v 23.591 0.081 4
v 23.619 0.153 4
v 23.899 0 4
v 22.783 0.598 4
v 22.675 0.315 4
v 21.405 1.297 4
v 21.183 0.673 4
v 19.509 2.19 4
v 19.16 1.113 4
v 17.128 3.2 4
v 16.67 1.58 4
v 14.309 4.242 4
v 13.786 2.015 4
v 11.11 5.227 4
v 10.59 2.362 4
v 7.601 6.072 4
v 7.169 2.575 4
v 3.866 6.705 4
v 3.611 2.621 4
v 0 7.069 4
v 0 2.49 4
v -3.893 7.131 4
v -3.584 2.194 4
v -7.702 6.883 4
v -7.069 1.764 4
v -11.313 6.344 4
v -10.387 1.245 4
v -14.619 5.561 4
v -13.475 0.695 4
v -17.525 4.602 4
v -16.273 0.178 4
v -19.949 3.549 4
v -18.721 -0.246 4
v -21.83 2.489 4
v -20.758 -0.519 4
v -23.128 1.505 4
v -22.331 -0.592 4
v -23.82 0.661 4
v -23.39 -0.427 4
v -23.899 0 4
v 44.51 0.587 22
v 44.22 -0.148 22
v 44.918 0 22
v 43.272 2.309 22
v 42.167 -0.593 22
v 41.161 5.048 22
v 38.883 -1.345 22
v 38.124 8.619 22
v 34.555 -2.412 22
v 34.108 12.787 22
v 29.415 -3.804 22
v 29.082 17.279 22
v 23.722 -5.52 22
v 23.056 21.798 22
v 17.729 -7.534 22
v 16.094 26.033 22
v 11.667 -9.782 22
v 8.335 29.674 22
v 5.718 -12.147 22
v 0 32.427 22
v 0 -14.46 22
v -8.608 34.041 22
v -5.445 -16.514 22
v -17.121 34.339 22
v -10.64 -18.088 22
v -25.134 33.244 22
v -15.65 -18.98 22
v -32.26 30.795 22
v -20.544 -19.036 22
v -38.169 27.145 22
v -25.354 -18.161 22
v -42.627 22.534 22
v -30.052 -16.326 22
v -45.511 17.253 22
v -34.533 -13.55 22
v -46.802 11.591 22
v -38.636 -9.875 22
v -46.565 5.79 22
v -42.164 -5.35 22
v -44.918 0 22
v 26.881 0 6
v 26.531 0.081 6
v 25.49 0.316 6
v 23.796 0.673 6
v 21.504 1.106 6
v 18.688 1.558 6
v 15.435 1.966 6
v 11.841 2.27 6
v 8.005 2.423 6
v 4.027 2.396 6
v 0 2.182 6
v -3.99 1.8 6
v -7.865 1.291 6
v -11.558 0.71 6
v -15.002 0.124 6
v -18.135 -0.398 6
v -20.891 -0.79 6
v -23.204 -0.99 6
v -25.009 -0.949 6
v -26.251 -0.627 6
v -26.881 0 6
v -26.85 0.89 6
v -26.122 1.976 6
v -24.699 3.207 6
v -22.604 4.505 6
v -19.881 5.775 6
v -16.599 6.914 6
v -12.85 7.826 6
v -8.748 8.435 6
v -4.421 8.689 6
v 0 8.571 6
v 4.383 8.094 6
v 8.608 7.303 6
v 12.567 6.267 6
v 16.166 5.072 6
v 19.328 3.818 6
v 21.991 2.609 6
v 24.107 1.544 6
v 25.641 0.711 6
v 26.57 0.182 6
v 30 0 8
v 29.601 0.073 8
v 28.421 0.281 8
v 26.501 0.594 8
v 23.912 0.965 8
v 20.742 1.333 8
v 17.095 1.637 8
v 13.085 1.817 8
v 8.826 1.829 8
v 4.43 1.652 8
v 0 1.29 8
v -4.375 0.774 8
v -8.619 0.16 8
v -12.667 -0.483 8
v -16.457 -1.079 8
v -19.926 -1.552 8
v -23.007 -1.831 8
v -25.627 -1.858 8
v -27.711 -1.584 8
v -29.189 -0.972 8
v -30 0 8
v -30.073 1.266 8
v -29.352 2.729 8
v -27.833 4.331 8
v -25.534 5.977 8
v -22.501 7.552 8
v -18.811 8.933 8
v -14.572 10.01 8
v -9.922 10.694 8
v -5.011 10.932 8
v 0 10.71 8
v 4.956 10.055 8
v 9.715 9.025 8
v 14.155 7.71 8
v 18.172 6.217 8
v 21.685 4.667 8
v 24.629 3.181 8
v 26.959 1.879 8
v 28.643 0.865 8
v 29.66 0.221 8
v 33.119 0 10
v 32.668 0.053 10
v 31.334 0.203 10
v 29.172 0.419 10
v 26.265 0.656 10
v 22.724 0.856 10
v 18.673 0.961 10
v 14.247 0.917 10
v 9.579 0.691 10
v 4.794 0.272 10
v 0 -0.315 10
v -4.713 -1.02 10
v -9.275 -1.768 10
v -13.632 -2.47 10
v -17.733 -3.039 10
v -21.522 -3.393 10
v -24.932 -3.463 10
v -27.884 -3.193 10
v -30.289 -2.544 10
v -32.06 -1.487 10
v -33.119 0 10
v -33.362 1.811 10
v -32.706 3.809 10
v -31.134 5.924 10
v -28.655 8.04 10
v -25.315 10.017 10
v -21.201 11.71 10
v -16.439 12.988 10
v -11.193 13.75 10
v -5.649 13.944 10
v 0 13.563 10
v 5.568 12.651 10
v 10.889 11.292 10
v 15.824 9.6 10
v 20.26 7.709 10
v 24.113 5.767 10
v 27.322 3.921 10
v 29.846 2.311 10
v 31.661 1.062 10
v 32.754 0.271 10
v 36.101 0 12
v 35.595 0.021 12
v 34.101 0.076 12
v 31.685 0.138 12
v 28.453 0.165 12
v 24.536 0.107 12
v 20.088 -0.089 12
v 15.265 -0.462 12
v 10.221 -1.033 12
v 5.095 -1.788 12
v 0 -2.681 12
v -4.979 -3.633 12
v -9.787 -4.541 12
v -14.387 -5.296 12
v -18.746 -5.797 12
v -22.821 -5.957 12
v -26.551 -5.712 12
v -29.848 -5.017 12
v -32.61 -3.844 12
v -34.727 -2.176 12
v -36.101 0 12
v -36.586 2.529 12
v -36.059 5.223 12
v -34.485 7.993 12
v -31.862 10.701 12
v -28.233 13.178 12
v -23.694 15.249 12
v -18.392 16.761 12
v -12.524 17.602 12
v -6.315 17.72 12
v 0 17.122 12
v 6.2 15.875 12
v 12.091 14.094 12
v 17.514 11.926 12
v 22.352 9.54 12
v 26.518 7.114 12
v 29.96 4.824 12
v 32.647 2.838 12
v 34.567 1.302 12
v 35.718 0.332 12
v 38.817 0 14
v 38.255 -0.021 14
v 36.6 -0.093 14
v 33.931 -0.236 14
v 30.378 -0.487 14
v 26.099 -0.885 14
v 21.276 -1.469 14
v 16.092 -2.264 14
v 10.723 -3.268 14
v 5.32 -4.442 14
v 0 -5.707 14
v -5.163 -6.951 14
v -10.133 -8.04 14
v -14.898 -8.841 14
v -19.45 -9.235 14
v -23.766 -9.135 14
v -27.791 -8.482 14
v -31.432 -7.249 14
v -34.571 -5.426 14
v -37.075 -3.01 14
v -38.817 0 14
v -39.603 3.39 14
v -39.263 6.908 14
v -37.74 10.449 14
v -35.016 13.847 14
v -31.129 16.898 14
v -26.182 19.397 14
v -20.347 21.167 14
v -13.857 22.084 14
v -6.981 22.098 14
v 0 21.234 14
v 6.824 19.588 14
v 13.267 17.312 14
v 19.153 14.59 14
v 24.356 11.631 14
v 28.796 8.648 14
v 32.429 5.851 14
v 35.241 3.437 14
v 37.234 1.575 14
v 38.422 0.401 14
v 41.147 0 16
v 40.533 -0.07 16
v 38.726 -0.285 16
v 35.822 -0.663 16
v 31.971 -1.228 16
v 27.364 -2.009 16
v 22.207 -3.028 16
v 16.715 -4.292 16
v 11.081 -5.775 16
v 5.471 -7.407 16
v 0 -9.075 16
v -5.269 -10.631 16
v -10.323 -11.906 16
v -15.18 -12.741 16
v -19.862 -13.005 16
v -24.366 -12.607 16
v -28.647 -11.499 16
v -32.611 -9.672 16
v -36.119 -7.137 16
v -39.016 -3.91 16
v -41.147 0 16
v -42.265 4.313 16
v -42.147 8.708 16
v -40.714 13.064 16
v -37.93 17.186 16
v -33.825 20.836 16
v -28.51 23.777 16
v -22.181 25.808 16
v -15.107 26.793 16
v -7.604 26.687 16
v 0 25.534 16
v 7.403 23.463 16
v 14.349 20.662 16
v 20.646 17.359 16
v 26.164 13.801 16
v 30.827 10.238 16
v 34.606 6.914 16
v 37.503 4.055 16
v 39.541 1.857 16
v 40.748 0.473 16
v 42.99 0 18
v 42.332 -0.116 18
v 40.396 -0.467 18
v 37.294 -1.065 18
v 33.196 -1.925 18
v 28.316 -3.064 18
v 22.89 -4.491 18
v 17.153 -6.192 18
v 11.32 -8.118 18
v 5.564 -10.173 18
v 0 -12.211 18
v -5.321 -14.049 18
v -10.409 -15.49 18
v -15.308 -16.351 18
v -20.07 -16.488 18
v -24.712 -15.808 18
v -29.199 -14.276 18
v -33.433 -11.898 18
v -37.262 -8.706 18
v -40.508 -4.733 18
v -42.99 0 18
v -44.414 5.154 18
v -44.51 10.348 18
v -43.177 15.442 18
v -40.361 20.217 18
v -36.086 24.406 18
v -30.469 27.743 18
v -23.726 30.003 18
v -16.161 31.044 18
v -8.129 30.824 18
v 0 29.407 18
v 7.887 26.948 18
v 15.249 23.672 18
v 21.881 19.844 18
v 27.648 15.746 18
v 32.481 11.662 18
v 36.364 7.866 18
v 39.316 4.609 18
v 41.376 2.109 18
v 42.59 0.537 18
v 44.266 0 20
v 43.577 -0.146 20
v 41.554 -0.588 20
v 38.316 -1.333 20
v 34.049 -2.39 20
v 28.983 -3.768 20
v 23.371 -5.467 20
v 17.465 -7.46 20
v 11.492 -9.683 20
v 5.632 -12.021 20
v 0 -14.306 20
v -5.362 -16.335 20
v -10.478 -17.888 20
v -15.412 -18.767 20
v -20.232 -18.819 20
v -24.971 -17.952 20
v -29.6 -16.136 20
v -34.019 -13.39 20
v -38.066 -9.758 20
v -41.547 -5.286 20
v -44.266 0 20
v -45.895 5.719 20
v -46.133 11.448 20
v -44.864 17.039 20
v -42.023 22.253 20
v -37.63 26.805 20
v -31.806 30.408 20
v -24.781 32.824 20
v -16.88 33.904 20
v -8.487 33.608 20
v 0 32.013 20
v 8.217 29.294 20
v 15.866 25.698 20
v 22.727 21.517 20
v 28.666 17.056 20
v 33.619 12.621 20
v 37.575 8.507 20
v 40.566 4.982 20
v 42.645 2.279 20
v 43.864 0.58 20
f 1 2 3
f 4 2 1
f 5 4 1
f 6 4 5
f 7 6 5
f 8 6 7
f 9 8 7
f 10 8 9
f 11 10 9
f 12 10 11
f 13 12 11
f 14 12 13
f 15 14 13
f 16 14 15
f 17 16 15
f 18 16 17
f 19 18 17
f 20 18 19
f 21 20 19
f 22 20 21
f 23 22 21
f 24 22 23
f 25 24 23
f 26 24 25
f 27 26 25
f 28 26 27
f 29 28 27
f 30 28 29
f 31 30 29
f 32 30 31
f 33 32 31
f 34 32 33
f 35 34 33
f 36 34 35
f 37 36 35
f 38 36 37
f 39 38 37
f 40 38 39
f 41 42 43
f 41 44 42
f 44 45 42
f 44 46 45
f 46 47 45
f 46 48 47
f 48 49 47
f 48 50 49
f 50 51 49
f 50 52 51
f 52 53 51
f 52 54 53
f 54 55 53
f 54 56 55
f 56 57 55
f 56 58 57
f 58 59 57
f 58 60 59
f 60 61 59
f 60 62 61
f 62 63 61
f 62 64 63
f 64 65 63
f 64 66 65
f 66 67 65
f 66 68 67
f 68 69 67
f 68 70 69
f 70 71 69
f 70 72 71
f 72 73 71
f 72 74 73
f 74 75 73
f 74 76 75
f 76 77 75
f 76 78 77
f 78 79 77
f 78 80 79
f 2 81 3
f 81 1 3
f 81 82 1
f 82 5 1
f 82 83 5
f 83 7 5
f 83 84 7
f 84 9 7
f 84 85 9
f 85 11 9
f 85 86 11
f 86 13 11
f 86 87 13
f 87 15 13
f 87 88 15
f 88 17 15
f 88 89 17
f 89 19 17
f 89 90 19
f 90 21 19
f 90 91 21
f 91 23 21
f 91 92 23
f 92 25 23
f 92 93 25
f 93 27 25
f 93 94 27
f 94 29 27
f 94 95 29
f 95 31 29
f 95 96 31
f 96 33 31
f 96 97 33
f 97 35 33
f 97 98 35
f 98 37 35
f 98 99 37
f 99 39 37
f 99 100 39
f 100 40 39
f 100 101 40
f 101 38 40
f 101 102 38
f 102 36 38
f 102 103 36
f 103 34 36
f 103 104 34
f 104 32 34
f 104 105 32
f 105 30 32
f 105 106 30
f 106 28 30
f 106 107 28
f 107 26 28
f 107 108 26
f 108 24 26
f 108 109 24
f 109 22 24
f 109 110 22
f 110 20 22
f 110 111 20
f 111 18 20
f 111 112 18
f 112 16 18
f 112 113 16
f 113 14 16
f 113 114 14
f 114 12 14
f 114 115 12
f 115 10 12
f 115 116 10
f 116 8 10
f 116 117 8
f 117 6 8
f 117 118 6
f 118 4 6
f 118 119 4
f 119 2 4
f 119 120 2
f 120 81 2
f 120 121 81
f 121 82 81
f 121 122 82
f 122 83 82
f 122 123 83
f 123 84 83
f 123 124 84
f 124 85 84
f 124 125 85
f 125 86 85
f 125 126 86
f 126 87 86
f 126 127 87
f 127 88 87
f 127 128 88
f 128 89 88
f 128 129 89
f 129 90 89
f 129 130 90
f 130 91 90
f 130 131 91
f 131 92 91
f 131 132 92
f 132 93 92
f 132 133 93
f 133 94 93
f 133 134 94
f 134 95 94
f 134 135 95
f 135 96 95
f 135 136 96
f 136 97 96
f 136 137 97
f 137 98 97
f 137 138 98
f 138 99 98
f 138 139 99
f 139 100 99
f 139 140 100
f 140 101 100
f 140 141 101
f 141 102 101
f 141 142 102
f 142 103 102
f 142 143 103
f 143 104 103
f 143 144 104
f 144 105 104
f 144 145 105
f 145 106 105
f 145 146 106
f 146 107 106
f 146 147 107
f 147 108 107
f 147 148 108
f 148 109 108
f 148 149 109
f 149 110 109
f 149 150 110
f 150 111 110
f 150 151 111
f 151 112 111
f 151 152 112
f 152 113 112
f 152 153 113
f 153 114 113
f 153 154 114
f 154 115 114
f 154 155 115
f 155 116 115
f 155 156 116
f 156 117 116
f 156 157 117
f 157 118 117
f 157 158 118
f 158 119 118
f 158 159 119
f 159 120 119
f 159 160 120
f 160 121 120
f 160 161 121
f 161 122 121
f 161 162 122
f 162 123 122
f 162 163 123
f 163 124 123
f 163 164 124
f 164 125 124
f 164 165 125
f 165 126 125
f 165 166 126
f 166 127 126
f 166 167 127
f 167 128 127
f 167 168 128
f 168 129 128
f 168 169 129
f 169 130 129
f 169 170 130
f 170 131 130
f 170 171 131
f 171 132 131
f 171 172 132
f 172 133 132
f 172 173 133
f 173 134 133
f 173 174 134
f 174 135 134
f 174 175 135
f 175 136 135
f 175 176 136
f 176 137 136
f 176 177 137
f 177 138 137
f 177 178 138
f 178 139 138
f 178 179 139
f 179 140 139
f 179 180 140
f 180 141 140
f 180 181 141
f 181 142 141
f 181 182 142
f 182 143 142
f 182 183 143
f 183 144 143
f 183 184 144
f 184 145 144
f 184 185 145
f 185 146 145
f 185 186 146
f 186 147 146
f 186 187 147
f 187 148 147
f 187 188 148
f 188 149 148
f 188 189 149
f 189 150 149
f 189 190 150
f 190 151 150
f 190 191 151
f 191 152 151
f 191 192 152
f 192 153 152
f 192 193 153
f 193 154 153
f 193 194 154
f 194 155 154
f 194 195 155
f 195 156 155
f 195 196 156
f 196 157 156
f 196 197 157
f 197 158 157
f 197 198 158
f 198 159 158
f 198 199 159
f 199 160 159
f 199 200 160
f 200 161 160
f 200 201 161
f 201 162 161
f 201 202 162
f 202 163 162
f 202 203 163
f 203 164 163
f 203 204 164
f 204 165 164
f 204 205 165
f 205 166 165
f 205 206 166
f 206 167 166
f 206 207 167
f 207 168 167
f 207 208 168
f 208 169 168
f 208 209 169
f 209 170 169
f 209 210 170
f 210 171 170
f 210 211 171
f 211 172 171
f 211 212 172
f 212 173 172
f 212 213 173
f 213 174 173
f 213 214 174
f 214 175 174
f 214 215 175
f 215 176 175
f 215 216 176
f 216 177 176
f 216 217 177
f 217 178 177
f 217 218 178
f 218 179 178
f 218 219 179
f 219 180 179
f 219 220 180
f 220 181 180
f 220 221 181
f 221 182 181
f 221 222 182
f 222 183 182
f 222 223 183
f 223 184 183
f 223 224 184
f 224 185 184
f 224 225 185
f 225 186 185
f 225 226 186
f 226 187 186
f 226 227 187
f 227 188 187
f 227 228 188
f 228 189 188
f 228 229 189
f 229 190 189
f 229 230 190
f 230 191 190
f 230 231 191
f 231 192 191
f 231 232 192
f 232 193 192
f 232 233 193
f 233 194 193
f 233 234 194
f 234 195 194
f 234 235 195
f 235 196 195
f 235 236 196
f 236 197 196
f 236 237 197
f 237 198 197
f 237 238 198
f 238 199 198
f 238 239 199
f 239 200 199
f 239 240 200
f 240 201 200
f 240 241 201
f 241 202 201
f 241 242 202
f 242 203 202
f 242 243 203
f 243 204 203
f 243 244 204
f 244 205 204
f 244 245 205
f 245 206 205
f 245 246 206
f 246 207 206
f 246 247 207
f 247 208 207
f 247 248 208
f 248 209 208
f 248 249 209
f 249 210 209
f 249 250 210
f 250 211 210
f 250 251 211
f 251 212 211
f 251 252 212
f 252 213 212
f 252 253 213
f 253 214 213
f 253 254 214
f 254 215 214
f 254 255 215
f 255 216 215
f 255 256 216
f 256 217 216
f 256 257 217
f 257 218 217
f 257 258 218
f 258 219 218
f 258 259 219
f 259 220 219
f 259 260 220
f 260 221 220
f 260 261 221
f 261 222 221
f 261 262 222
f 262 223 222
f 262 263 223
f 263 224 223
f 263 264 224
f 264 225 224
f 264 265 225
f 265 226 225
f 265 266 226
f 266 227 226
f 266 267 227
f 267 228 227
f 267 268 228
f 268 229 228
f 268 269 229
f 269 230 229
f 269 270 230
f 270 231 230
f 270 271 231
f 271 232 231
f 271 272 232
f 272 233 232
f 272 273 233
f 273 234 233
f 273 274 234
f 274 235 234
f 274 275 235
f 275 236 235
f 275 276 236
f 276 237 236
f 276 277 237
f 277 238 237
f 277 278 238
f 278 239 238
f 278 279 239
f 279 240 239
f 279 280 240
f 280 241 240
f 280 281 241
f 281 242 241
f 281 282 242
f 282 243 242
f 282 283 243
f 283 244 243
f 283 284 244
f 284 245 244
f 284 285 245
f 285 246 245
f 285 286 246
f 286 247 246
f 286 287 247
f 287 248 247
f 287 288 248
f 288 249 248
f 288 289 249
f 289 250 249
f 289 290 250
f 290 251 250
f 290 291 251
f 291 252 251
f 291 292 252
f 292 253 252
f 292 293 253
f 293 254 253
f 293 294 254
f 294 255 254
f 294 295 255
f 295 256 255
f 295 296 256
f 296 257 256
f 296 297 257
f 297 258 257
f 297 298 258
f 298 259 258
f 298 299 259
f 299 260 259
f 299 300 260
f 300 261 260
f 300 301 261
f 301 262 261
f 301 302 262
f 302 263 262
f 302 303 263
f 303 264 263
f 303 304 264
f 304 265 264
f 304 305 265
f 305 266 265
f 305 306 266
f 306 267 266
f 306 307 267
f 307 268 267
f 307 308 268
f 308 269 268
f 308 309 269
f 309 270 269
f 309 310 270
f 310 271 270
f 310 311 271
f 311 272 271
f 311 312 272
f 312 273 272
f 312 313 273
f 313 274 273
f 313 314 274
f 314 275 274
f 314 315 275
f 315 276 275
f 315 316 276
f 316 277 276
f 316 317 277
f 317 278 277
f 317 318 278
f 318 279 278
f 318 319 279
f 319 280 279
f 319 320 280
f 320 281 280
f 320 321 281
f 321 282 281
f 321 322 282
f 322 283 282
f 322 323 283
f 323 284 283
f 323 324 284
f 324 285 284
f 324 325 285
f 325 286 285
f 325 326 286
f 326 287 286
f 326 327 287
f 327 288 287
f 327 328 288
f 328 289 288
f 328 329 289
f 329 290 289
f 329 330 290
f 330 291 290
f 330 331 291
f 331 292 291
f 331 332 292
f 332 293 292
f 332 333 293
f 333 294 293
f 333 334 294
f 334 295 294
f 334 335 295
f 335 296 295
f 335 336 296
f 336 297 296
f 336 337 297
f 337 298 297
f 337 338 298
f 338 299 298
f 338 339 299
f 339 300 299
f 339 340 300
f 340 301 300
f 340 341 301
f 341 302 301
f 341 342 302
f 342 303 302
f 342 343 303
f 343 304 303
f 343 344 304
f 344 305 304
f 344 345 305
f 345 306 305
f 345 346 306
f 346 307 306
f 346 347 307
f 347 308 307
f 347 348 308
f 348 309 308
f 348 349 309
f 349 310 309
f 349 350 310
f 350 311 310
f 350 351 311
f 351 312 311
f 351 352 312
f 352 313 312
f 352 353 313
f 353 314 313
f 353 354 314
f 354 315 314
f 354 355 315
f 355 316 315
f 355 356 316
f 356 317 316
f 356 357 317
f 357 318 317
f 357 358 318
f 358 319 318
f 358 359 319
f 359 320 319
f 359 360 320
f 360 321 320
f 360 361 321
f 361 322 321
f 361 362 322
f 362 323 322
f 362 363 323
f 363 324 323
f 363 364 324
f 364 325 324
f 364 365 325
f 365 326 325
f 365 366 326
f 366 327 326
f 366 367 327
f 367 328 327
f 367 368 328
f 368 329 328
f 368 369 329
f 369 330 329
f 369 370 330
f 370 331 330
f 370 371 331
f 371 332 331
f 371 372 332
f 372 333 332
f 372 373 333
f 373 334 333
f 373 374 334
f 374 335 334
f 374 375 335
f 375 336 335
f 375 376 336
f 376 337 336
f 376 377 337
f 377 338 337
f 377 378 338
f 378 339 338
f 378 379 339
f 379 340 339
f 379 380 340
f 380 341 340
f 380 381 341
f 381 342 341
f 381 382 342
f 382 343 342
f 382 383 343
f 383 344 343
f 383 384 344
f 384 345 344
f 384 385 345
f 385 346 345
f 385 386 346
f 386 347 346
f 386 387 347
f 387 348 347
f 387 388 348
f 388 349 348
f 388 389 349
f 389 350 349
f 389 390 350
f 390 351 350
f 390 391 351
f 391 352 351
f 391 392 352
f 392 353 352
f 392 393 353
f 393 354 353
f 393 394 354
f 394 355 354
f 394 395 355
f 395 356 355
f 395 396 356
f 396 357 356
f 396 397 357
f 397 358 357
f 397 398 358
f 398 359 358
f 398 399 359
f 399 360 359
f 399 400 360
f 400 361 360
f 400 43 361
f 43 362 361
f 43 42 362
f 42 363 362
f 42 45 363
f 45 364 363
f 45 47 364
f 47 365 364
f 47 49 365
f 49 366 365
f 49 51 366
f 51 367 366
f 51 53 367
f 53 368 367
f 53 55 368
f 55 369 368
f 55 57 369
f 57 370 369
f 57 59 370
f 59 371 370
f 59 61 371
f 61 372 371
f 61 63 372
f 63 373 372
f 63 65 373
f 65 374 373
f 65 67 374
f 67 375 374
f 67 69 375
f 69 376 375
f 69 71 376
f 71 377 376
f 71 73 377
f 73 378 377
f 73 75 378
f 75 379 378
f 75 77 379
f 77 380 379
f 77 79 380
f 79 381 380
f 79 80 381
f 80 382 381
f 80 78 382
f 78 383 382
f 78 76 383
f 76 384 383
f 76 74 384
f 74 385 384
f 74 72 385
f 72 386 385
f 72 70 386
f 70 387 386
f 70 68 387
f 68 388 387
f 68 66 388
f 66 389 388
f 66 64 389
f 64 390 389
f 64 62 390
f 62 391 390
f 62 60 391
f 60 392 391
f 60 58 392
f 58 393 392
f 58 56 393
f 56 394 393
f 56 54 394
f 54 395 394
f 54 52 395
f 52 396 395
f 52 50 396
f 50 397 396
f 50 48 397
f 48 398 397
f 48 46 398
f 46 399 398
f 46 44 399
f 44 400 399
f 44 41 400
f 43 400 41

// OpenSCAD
// file: naca4.scad
// Naca4.scad - library for parametric airfoils of 4 digit NACA series
// Code: Rudolf Huttary, Berlin
// June 2015
// commercial use prohibited


// general use: for more examples refer to sampler.scad
// naca = naca digits or 3el vector  (default = 12 or [0, 0, .12])
// L    = chord length [mm]      (default= 100)
// N    = # sample points        (default= 81)
// h    = height [mm]            (default= 1)
// open = close at the thin end? (default = true)
// two equivalent example calls
 airfoil(naca = 2408, L = 60, N=1001, h = 30, open = false);
// airfoil(naca = [.2, .4, .32], L = 60, N=1001, h = 30, open = false);

module help()
{
  echo(str("\n\nList of signatures in lib:\n=================\n",
  "module airfoil(naca=2412, L = 100, N = 81, h = 1, open = false) - renders airfoil object\n",
  "module airfoil(naca=[.2, .4, .12], L = 100, N = 81, h = 1, open = false) - renders airfoil object using percentage for camber,  camber distance and thicknes\n",
  "function airfoil_data(naca=12, L = 100, N = 81, open = false)\n",
  "=================\n"));
}

help();
// this is the object
module airfoil(naca=12, L = 100, N = 81, h = 1, open = false)
{
  linear_extrude(height = h)
  polygon(points = airfoil_data(naca, L, N, open));
}

// this is the main function providing the airfoil data
function airfoil_data(naca=12, L = 100, N = 81, open = false) =
  let(Na = len(naca)!=3?NACA(naca):naca)
  let(A = [.2969, -0.126, -.3516, .2843, open?-0.1015:-0.1036])
  [for (b=[-180:360/(N):179.99])
    let (x = (1-cos(b))/2)
    let(yt = sign(b)*Na[2]/.2*(A*[sqrt(x), x, x*x, x*x*x, x*x*x*x]))
    Na[0]==0?L*[x, yt]:L*camber(x, yt, Na[0], Na[1], sign(b))];

// helper functions
function NACA(naca) =
  let (M = floor(naca/1000))
  let (P = floor((naca-M*1000)/100))
  [M/100, P/10, floor(naca-M*1000-P*100)/100];

function camber(x, y, M, P, upper) =
  let(yc = (x<P)?M/P/P*(2*P*x-x*x): M/(1-P)/(1-P)*(1 - 2*P + 2*P*x -x*x))
  let(dy = (x<P)?2*M/P/P*(P-x):2*M/(1-P)/(1-P)*(P-x))
  let(th = atan(dy))
  [upper ? x - y*sin(th):x + y*sin(th), upper ? yc + y*cos(th):yc - y*cos(th)];
// main file
// Naca4_sweep.scad - sweep library
// Code: Rudolf Huttary, Berlin
// 1st release : June 2015
// last update: 2017.02.10
// commercial use prohibited

use <naca4.scad>

//example1();
//rotate([80, 180, 130])
example();

// sweep from NACA1480 to NACA6480 (len = 230 mm, winding y,z = 80°
// sweeps generates a single polyhedron from multiple datasets
module example()
{
  N = 40;
  sweep(gen_dat(N=5, dz=1,N=N), showslices = false);
//  sweep(gen_dat(N=5, dz=1,N=N), showslices = true);

  // specific generator function
  function gen_dat(M=10,dz=.1,N=10) = [for (i=[1:dz:M])
    let( L = length(i))
    let( af = vec3D(
        airfoil_data([.1,.5,thickness(i)], L=length(i), N = N)))
    T_(-L/2, 0, (i+1)*2, af)];  // translate airfoil

  function thickness(i) = .5*sin(i*i)+.1;
  function length(i) = (60+sin(12*(i-3))*30);
}

module help()
{
  echo(str("\n\nNaca4_sweep library by Rudolf Huttary\n",
  "List of signatures in lib:\n=================\n",
  "sweep(dat, convexity = 5, showslices = false, close = false)  // dat - vec of vec2, with vec1 = airfoil_data\n",
  "function vec3D(v, z=0)  // expand vec2 to vec3",
  "function rot(w=0, p) // rotate vec2",
  "function T_(x=0, y=0, z=0, v) // translates vec of vec3\n",
  "function R_(x=0, y=0, z=0, v) // rotates vec of vec3\n",
  "function Rx_(x=0, v) // x-rotates vec of vec3\n",
  "function Ry_(y=0, v) // y-rotates vec of vec3\n",
  "function Rz_(z=0, v) // z-rotates vec of vec3\n",
  "function T_(x=0, y=0, z=0, v) // translates vec of vec3\n",
  "function Tx_(x=0, v) // x-translates vec of vec3\n",
  "function Ry_(y=0, v) // y-translates vec of vec3\n",
  "function Rz_(z=0, v) // z-translates vec of vec3\n",
  "function S_(x=0, y=0, z=0, v) // scales vec of vec3\n",
  "function Sx_(x=0, v) // x-translates vec of vec3\n",
  "function Sy_(x=0, v) // y-translates vec of vec3\n",
  "function Sz_(x=0, v) // z-translates vec of vec3\n",
  "=================\n"));
}


// generate polyhedron from multiple airfoil_datasets
// dat - vec of vec1, with vec1 = simple polygon like airfoil_data, > 3 points per dataset expected
// use "planar_caps = false" only for non-planar cap faces with cord line symmetry
module sweep(dat, convexity = 5, showslices = false, close = false, planar_caps = false)
{
  n = len(dat);     // # datasets
  l = len(dat[0]);  // points per dataset
  if(l<=3) echo("ERROR: sweep() expects more than 3 points per dataset");
  if (showslices)
    for(i=[0:n-1]) polyhedron(points = dat[i], faces = [count(l-1, 0)]);
  else
  {
    obj = sweep_(dat, close=close, planar_caps=planar_caps);
    polyhedron(obj[0], obj[1], convexity = 5);
  }
}
  function count(a, b) = [for (i=[a:(a<b?1:-1):b]) i];

function sweep_(dat, close = false, planar_caps = true) =
  let(n=len(dat), l=len(dat[0]))
  let(first = planar_caps?[count(l-1, 0)]:
            faces_polygon(l, true))  // indices first face
  let(last = planar_caps?[count((n-1)*l,(n)*l-1)]:
            faces_shift((n-2)*l, faces_polygon(l, false))) // indices last face
  let(faces = close?faces_sweep(l,n, close) :concat(first, last, faces_sweep(l,n)))
  let(points = [for (i=[0:n-1], j=[0:l-1]) dat[i][j]]) // flatten points vector
    [points, faces];

function faces_shift(d, dat) = [for (i=[0:len(dat)-1]) dat[i] + [d, d, d]];


function del(A, n) = [for(i=[0:len(A)-1]) if (n!=i)A[i]];

//// knitting for polyhedron
  function faces_sweep(l, n=1, close = false) =
      let(M = n*l, n1=close?n+1:n)
      concat([[0,l,l-1]],   // first face
             [for (i=[0:l*(n1-1)-2], j = [0,1])
                j==0? [i, i+1, (i+l)%M]
                    : [i+1, (i+l+1)%M, (i+l)%M]
             ]
             ,[[(n1*l-1)%M, (n1-1)*l-1, ((n1-1)*l)%M]
             ]); // last face
      ;

  function faces_polygon(l, first = true) = let(odd = (l%2==1), d=first?0:l)
    let(res = odd?concat([[d,d+1,d+l-1]],
      [for (i=[1:(l-3)/2], j=[0,1])(j==0)?[d+i,d+i+1,d+l-i]:[d+i+1,d+l-i-1, d+l-i]]):
      [for (i=[0:(l-4)/2], j=[0,1])(j==0)?[d+i,d+i+1,d+l-i-1]:[d+i+1,d+l-i-2, d+l-i-1]])
    first?facerev(res):res;

  function facerev(dat) = [for (i=[0:len(dat)-1]) [dat[i][0],dat[i][2],dat[i][1]]];



//// vector and vector set operation stuff ///////////////////////
//// Expand 2D vector into 3D
function vec3D(v, z=0) = [for(i = [0:len(v)-1])
  len(v[i])==2?[v[i][0], v[i][1], z]:v[i]+[0, 0, z]];

// Translation - 1D, 2D, 3D point vector //////////////////////////
// vector along all axes
function T_(x=0, y=0, z=0, v) = let(x_ = (len(x)==3)?x:[x, y, z])
  [for (i=[0:len(v)-1]) T__(x_[0], x_[1], x_[2], p=v[i])];
/// vector along one axis
function Tx_(x=0, v) = T_(x=x, v=v);
function Ty_(y=0, v) = T_(y=y, v=v);
function Tz_(z=0, v) = T_(z=z, v=v);
/// point along all axes 1D, 2D, 3D allowed
function T__(x=0, y=0, z=0, p) = len(p)==3?p+[x, y, z]:len(p)==2?p+[x, y]:p+x;

//// Rotation - 2D, 3D point vector ///////////////////////////////////
// vector around all axes
function R_(x=0, y=0, z=0, v) =             // 2D vectors allowed
  let(x_ = (len(x)==3)?x:[x, y, z])
  len(v[0])==3?Rz_(x_[2], Ry_(x_[1], Rx_(x_[0], v))):
  [for(i = [0:len(v)-1]) rot(x_[2], v[i])];
// vector around one axis
function Rx_(w, A) = A*[[1, 0, 0], [0, cos(w), sin(w)], [0, -sin(w), cos(w)]];
function Ry_(w, A) = A*[[cos(w), 0, sin(w)], [0, 1, 0], [-sin(w), 0, cos(w)]];
function Rz_(w, A) = A*[[cos(w), sin(w), 0], [-sin(w), cos(w), 0], [0, 0, 1]];


//// Scale - 2D, 3D point vector ///////////////////////////////////
// vector along all axes
function S_(x=1, y=1, z=1, v) =
  [for (i=[0:len(v)-1]) S__(x,y,z, v[i])];
// vector along one axis
function Sx_(x=0, v) = S_(x=x, v=v);
function Sy_(y=0, v) = S_(y=y, v=v);
function Sz_(z=0, v) = S_(z=z, v=v);
// single point in 2D
function S__(x=1, y=1, z=1, p) =
  len(p)==3?[p[0]*x, p[1]*y, p[2]*z]:len(p)==2?[p[0]*x+p[1]*y]:[p[0]*x];
